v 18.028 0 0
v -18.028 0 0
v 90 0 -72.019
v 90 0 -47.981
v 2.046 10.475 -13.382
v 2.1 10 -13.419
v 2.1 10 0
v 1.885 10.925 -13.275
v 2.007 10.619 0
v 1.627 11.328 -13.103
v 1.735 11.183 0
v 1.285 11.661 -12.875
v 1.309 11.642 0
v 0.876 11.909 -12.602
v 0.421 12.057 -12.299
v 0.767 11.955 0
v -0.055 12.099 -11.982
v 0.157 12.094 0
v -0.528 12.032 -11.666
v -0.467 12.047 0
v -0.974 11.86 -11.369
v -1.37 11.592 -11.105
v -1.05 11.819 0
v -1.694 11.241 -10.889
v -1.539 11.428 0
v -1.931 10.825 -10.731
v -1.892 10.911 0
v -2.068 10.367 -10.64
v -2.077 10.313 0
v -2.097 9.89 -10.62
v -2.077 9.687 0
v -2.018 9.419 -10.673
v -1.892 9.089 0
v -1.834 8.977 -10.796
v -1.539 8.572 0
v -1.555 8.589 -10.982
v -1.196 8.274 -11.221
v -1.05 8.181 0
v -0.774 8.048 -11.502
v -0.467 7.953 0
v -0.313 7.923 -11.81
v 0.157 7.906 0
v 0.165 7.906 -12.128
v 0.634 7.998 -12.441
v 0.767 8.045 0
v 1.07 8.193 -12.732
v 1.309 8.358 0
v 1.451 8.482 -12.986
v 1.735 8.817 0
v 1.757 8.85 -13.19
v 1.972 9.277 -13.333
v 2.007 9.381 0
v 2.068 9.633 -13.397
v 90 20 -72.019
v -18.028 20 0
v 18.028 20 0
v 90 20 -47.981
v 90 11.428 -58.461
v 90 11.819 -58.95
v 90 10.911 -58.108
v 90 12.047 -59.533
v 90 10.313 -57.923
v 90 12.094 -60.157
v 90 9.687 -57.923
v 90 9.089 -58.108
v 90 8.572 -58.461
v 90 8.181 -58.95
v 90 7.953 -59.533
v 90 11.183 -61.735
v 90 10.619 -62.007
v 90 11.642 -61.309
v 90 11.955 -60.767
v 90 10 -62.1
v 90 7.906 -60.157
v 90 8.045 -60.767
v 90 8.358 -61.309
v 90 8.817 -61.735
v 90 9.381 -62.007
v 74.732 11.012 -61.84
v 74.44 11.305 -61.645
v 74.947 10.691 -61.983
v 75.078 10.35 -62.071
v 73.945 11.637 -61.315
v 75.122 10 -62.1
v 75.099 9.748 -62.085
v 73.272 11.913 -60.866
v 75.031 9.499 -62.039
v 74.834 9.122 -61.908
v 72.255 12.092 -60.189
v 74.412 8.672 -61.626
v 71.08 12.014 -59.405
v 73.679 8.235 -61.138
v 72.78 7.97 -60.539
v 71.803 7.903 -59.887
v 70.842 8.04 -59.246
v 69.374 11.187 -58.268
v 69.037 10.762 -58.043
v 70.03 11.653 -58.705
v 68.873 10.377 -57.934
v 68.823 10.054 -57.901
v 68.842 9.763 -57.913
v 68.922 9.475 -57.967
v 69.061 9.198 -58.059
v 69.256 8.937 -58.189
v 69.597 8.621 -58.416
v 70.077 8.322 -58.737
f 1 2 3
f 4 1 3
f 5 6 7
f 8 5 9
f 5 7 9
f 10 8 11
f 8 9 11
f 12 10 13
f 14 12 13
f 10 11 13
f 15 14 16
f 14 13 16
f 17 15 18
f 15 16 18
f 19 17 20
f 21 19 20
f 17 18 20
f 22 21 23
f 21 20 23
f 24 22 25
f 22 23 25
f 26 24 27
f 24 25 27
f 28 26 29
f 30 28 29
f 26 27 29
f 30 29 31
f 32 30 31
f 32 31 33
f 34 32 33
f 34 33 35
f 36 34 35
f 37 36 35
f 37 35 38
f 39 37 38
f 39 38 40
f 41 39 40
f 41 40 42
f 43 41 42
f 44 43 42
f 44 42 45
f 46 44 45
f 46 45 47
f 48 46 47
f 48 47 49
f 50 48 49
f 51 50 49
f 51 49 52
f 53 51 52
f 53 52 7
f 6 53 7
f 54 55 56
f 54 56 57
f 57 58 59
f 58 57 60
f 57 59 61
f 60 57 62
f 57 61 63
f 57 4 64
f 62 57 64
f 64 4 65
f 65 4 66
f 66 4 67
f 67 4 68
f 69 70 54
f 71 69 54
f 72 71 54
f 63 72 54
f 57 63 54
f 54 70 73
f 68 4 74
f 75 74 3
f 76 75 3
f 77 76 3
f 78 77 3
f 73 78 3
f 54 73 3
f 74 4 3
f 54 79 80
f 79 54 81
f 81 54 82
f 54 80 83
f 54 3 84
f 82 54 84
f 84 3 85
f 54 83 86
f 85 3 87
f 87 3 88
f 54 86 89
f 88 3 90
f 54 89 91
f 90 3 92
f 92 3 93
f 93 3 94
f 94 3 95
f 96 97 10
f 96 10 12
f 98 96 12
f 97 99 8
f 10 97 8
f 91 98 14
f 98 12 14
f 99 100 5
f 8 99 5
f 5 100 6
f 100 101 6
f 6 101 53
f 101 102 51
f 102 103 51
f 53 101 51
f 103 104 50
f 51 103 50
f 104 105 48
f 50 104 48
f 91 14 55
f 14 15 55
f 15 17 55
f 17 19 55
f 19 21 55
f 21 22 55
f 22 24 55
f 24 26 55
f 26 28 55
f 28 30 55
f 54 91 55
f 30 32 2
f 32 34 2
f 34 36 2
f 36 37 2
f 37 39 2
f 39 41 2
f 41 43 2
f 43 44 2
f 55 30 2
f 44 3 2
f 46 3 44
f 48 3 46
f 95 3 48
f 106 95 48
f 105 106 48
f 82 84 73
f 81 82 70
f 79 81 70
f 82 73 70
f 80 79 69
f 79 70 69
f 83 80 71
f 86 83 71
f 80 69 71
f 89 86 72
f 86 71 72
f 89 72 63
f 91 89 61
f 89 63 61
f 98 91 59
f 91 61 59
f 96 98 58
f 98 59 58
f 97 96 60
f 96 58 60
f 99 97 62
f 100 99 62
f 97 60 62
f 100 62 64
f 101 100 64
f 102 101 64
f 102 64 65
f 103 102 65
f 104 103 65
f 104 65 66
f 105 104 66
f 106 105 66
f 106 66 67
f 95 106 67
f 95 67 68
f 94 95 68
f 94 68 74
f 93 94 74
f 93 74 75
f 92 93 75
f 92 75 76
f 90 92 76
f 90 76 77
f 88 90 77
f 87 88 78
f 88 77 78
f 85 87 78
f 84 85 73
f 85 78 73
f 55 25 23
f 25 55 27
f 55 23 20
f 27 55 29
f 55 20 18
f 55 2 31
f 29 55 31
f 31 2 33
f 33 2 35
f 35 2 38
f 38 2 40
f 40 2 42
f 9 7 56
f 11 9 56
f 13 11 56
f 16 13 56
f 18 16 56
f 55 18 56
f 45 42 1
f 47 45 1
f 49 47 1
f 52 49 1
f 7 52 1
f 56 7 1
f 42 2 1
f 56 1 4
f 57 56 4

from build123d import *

# Parameters (mm, degrees)
EXTRUDE_1_DEPTH     = 20
SKETCH_2_R          = 2.1
CUT_EXTRUDE_2_DEPTH = 132.364611302
SKETCH_6_R          = 2.1
CUT_EXTRUDE_3_DEPTH = 117.990020748


with BuildPart() as part:
    # 草图1 → 凸台-拉伸1 (new body)
    with BuildSketch(Plane(origin=(0, 0, 0), x_dir=(1, 0, 0), z_dir=(0, 1, 0))):
        Polygon((90, 72.018504252), (-18.027756377, 0), (18.027756377, 0), (90, 47.981495748), align=None)
    extrude(amount=EXTRUDE_1_DEPTH)

    # 草图2 → 切除-拉伸2 (cut, through all)
    with BuildSketch(Plane(origin=(90, 0, 0), x_dir=(0, 0, -1), z_dir=(1, 0, 0))):
        with Locations((60, 10)):
            Circle(SKETCH_2_R)
    extrude(amount=-CUT_EXTRUDE_2_DEPTH, mode=Mode.SUBTRACT)

    # 草图6 → 切除-拉伸3 (cut, through all)
    with BuildSketch(Plane.XY):
        with Locations((0, 10)):
            Circle(SKETCH_6_R)
    extrude(amount=-CUT_EXTRUDE_3_DEPTH, mode=Mode.SUBTRACT)


solid = part.part
